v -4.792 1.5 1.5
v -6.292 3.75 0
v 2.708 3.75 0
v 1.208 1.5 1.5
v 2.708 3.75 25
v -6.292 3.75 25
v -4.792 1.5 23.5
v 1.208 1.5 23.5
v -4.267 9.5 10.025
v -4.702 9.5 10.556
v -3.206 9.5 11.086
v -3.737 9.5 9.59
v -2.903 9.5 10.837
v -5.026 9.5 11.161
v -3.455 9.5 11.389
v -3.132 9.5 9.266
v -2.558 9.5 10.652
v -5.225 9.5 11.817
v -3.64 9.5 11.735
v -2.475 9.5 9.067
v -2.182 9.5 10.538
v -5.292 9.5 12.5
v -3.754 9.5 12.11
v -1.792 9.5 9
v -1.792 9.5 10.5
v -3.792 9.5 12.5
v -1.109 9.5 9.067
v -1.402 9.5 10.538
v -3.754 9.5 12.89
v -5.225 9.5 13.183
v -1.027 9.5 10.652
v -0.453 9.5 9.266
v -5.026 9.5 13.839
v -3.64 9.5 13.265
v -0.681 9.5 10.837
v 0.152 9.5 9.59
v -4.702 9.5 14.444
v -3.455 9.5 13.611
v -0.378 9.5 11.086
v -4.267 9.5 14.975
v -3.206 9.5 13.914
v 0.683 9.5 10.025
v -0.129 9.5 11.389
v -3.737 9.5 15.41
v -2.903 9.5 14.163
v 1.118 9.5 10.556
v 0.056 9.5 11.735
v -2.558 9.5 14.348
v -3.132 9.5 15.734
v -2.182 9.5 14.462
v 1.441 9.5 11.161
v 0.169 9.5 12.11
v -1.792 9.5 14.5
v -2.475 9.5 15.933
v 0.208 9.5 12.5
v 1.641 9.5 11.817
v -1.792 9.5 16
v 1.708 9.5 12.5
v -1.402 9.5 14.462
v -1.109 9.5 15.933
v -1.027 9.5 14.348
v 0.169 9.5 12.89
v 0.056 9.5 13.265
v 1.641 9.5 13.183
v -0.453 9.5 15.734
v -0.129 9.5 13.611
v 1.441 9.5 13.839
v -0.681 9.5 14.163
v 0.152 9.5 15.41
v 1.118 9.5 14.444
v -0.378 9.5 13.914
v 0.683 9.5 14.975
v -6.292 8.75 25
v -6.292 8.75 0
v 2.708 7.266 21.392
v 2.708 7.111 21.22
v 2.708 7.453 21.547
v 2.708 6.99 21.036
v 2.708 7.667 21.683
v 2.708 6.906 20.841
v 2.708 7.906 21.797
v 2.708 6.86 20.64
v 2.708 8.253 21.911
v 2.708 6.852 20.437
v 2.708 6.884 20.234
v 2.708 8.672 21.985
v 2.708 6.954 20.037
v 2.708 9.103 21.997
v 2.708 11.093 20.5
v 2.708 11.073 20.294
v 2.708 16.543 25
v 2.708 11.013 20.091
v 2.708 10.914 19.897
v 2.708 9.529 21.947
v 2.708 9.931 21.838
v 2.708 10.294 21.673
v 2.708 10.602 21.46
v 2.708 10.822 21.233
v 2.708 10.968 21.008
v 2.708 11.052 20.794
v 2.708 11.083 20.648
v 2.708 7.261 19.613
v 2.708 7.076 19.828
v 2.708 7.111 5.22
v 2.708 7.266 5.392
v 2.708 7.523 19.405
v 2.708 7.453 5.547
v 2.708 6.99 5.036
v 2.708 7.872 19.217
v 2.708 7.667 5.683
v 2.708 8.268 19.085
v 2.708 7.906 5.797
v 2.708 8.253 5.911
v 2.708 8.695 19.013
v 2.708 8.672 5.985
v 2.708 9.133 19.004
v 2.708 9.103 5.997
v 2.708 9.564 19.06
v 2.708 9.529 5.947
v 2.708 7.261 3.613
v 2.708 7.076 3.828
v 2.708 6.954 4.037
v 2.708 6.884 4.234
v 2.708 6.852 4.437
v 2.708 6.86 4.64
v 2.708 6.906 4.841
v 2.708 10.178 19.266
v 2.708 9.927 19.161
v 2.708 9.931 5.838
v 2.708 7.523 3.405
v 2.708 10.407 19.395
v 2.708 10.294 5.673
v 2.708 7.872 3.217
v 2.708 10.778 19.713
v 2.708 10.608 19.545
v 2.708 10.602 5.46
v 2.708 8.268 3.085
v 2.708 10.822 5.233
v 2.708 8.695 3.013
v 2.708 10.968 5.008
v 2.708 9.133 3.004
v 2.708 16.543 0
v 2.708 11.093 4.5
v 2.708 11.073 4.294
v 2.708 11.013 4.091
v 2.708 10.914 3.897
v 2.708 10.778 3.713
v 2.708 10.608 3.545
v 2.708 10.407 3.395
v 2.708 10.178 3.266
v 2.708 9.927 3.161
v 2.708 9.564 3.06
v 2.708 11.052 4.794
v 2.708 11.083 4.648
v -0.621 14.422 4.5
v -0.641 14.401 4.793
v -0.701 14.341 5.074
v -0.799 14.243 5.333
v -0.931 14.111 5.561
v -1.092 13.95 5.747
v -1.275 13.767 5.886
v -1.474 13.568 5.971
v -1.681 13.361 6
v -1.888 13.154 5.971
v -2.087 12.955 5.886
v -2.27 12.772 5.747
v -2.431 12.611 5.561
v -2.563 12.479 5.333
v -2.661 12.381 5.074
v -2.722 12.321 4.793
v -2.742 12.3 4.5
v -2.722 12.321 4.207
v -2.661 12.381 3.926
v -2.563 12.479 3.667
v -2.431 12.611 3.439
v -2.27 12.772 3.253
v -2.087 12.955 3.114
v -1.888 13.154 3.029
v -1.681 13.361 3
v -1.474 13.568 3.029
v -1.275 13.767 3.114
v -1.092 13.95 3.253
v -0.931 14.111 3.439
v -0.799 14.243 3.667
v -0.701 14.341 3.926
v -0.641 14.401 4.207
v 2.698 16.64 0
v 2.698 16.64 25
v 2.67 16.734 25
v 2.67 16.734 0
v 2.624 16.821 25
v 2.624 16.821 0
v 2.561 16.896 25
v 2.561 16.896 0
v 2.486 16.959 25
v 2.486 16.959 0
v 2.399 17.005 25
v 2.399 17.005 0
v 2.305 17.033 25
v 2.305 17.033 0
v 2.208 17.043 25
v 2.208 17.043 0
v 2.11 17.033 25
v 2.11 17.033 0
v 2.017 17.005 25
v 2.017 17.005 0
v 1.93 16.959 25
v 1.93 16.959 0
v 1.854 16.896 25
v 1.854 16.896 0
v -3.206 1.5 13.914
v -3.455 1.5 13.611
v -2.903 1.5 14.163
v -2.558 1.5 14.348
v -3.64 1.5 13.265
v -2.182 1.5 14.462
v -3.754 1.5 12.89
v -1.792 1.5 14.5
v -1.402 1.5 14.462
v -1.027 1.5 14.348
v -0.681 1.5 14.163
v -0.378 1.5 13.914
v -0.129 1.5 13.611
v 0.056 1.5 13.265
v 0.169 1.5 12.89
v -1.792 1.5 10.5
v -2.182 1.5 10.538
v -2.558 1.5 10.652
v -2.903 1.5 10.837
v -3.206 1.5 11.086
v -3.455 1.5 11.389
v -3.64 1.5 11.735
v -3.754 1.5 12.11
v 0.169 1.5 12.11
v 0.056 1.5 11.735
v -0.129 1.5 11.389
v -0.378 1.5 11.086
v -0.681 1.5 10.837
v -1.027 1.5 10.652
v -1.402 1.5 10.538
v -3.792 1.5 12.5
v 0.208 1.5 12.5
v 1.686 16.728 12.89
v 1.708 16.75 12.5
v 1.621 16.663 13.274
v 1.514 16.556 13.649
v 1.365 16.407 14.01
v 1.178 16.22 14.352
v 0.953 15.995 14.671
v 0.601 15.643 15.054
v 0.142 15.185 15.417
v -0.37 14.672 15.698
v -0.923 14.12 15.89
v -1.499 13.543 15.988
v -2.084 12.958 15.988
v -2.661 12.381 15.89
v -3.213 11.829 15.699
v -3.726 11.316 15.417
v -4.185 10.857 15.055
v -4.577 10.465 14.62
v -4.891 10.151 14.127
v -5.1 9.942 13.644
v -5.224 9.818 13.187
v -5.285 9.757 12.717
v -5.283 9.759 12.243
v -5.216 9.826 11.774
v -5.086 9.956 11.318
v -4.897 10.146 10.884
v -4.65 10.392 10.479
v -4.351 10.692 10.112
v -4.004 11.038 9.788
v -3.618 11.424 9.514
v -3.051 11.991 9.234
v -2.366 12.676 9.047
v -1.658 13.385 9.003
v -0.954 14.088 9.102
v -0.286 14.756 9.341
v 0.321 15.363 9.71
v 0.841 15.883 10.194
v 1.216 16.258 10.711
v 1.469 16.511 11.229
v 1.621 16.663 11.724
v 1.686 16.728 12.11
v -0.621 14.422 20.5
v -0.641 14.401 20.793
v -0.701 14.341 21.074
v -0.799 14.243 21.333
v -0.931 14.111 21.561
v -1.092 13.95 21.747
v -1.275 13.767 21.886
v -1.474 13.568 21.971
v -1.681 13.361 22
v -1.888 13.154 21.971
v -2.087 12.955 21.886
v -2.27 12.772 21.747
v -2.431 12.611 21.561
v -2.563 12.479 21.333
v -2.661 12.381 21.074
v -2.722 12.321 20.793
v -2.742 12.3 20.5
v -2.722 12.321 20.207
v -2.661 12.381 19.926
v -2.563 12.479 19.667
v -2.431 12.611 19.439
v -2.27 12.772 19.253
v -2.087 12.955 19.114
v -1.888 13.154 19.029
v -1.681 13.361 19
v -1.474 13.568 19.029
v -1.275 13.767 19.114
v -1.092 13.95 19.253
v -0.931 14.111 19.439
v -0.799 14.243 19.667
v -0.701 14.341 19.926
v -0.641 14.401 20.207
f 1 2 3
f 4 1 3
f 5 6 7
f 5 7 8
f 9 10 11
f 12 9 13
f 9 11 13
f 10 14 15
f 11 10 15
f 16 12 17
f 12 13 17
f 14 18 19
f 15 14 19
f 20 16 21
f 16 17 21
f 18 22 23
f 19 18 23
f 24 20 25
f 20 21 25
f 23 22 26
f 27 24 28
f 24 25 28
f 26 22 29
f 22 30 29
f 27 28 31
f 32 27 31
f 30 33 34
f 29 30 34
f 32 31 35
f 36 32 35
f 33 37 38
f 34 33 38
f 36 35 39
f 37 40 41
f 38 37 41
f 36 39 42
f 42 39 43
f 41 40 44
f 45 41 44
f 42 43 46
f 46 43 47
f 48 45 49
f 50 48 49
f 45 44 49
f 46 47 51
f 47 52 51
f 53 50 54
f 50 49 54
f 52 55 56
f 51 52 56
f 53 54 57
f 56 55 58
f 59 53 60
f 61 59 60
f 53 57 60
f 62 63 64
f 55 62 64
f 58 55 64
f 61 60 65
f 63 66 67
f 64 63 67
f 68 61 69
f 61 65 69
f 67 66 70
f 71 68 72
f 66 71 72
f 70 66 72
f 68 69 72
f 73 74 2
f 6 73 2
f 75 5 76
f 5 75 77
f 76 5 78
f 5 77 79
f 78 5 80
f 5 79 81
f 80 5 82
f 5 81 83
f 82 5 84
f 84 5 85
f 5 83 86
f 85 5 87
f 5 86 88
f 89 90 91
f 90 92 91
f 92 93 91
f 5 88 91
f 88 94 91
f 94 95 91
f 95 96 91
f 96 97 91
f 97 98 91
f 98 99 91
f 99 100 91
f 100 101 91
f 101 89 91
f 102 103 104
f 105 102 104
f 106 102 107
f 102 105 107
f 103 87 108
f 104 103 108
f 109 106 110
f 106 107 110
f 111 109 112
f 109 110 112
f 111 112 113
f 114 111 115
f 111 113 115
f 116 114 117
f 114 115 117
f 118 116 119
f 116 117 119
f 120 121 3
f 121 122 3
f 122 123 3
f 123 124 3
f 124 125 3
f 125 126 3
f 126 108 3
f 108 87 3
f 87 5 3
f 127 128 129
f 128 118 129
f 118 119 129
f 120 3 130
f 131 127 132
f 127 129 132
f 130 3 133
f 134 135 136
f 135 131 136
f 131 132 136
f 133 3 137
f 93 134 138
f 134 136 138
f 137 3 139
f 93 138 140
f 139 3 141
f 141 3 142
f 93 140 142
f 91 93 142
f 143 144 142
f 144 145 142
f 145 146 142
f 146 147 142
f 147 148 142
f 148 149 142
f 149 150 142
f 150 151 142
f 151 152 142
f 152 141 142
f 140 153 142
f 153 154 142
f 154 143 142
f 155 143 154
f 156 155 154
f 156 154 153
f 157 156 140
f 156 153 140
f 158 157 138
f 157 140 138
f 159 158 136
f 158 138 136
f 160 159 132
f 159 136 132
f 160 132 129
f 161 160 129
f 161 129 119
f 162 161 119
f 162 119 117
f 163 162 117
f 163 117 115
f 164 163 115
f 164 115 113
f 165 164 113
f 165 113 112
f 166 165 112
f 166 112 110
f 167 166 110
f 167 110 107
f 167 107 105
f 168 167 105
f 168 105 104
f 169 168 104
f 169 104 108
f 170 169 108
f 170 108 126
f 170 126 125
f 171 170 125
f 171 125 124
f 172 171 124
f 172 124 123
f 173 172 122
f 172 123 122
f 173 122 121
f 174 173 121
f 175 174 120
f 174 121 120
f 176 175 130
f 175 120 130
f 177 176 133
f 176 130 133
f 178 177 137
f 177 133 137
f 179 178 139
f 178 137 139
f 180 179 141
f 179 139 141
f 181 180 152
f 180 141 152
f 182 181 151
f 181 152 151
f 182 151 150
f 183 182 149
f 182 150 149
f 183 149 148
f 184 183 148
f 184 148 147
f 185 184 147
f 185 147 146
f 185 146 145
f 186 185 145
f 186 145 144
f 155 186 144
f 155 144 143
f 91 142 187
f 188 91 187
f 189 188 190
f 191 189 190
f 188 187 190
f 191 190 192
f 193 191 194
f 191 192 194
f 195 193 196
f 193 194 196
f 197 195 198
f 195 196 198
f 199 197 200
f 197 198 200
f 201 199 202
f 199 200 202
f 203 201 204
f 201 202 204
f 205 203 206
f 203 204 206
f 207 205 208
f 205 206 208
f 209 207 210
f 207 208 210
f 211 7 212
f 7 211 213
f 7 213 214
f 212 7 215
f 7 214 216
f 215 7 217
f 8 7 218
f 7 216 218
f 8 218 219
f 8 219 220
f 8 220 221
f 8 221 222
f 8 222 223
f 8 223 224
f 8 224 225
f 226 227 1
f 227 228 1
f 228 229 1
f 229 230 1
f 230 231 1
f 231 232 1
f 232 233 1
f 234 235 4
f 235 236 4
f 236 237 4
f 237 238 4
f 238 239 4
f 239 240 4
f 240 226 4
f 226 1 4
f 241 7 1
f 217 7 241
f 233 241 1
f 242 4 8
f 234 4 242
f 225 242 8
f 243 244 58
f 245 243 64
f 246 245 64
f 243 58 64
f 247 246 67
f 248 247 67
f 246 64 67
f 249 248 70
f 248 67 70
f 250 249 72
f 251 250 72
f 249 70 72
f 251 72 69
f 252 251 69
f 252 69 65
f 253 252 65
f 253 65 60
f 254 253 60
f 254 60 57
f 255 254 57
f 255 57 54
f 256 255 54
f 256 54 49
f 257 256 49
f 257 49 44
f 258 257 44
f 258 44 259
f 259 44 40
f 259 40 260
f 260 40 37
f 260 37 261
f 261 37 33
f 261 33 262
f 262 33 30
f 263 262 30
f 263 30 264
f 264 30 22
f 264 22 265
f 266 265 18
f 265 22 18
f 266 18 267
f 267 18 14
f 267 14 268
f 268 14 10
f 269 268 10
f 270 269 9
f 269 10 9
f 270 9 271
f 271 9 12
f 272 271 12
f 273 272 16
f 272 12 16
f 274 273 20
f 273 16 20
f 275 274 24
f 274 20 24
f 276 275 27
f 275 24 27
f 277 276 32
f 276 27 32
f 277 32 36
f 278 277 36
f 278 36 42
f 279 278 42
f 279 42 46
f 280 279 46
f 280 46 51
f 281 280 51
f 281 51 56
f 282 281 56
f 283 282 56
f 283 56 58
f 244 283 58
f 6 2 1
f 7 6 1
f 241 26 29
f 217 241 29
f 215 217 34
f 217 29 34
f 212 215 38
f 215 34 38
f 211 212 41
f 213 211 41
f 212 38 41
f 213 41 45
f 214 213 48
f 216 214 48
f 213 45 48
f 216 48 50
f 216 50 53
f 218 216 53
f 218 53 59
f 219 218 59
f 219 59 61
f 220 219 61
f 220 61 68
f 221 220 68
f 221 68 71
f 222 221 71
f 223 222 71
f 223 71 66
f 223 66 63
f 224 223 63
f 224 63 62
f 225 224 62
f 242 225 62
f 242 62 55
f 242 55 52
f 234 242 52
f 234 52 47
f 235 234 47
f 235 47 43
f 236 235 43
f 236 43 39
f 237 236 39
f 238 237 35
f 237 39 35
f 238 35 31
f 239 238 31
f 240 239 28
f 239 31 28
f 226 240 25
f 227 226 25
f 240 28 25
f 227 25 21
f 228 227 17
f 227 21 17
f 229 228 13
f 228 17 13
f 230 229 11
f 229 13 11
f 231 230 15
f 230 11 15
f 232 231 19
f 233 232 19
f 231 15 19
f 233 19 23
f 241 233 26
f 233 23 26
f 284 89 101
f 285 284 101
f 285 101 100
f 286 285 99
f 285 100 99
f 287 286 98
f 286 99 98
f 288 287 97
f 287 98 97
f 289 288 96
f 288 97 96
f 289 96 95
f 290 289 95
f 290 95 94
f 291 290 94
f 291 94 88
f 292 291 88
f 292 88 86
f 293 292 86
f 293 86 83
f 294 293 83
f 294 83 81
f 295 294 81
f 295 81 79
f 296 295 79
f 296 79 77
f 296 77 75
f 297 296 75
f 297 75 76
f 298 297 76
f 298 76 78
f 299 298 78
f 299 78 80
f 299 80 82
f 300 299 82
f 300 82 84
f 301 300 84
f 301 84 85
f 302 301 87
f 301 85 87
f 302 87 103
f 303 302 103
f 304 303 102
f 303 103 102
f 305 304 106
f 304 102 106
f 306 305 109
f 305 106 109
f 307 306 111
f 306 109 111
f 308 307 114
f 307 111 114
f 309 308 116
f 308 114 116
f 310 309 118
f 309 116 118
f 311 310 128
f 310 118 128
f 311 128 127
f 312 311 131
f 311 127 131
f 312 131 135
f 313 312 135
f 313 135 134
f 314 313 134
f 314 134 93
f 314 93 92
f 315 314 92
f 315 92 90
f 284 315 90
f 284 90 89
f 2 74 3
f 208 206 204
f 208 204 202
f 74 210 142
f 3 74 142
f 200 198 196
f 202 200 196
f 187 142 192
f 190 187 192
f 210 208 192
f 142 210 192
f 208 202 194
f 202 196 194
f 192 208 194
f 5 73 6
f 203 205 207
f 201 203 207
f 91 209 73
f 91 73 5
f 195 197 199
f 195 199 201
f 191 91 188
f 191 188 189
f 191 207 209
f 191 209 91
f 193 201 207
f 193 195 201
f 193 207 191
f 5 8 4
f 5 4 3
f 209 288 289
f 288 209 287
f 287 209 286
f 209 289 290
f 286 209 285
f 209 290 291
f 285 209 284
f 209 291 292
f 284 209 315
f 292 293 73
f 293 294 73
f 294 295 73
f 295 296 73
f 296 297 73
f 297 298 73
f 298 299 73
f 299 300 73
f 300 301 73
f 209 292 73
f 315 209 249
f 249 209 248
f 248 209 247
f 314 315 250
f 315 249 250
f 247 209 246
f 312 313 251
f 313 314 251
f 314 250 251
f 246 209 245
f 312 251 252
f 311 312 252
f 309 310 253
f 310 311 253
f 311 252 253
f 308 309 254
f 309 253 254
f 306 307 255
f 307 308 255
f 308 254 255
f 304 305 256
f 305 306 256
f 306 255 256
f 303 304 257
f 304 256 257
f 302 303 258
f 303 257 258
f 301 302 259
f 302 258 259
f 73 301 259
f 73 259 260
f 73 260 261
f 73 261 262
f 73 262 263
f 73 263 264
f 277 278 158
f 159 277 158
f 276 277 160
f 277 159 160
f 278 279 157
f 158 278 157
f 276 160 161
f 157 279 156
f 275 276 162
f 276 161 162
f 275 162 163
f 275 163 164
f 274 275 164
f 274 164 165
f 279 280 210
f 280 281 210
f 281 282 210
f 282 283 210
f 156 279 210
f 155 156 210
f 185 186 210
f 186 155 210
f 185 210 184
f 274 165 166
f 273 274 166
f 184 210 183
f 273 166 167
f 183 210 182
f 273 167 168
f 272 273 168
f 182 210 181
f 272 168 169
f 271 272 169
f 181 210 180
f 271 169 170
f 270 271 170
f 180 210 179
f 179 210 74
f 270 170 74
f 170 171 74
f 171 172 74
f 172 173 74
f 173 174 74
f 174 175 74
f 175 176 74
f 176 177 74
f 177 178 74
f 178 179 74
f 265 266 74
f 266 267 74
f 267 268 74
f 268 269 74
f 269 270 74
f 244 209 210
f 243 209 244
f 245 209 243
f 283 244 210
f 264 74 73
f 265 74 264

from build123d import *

# Parameters (mm, degrees)
F1_DEPTH = 25
F2_SIZE2 = 2.25
F2_SIZE  = 1.5
F4_D     = 4
F6_D     = 3
F9_D     = 7
F9_DEPTH = 7.5438932188


# Not quite as in the source:
# - a feature names something its author has since deleted; it is built from what else it names


with BuildPart() as f1:
    # F0 (on Top) → F1 (new body)
    with BuildSketch(Plane.XY):
        with BuildLine():
            Line((2.7078659423, 3.7500000373), (2.7078659423, 8.7500000373))
            Line((2.7078659423, 8.7500000373), (2.7078659423, 16.5428932561))
            ThreePointArc((2.7078659423, 16.5428932561), (2.3992076585, 17.0048330223), (1.8543125517, 16.8964466467))
            Line((1.8543125517, 16.8964466467), (-6.2921340577, 8.7500000373))
            Line((-6.2921340577, 8.7500000373), (-6.2921340577, 3.7500000373))
            Line((-6.2921340577, 3.7500000373), (-4.7921340577, 1.5000000373))
            Line((-4.7921340577, 1.5000000373), (1.2078659423, 1.5000000373))
            Line((1.2078659423, 1.5000000373), (2.7078659423, 3.7500000373))
        make_face()
    extrude(amount=F1_DEPTH)

    # F2
    f2_edges = [f1.edges().sort_by_distance(p)[0] for p in [
        (-1.792134, 1.5, 25),
        (-1.792134, 1.5, 0),
    ]]
    chamfer(f2_edges, length=F2_SIZE, length2=F2_SIZE2)

    # F4 (through all)
    with Locations(Plane.XZ.offset(-1.5000000373)):
        with Locations((-1.7921340577, 12.5)):
            Hole(F4_D / 2)

    # F6 (through all)
    with Locations(Plane(origin=(-7.5210670475, 7.5210670475, 0), x_dir=(-0.7071067812, -0.7071067812, 0), z_dir=(-0.7071067812, 0.7071067812, 0))):
        with Locations((-8.2587889815, 4.5), (-8.2587889815, 20.5)):
            Hole(F6_D / 2)

    # F9 (through all, one way)
    with BuildSketch(Plane.XZ.offset(-9.5000000373)):
        with Locations((-1.7921340577, 12.5)):
            Circle(F9_D / 2)
    extrude(amount=-F9_DEPTH, mode=Mode.SUBTRACT)


solid = f1.part
